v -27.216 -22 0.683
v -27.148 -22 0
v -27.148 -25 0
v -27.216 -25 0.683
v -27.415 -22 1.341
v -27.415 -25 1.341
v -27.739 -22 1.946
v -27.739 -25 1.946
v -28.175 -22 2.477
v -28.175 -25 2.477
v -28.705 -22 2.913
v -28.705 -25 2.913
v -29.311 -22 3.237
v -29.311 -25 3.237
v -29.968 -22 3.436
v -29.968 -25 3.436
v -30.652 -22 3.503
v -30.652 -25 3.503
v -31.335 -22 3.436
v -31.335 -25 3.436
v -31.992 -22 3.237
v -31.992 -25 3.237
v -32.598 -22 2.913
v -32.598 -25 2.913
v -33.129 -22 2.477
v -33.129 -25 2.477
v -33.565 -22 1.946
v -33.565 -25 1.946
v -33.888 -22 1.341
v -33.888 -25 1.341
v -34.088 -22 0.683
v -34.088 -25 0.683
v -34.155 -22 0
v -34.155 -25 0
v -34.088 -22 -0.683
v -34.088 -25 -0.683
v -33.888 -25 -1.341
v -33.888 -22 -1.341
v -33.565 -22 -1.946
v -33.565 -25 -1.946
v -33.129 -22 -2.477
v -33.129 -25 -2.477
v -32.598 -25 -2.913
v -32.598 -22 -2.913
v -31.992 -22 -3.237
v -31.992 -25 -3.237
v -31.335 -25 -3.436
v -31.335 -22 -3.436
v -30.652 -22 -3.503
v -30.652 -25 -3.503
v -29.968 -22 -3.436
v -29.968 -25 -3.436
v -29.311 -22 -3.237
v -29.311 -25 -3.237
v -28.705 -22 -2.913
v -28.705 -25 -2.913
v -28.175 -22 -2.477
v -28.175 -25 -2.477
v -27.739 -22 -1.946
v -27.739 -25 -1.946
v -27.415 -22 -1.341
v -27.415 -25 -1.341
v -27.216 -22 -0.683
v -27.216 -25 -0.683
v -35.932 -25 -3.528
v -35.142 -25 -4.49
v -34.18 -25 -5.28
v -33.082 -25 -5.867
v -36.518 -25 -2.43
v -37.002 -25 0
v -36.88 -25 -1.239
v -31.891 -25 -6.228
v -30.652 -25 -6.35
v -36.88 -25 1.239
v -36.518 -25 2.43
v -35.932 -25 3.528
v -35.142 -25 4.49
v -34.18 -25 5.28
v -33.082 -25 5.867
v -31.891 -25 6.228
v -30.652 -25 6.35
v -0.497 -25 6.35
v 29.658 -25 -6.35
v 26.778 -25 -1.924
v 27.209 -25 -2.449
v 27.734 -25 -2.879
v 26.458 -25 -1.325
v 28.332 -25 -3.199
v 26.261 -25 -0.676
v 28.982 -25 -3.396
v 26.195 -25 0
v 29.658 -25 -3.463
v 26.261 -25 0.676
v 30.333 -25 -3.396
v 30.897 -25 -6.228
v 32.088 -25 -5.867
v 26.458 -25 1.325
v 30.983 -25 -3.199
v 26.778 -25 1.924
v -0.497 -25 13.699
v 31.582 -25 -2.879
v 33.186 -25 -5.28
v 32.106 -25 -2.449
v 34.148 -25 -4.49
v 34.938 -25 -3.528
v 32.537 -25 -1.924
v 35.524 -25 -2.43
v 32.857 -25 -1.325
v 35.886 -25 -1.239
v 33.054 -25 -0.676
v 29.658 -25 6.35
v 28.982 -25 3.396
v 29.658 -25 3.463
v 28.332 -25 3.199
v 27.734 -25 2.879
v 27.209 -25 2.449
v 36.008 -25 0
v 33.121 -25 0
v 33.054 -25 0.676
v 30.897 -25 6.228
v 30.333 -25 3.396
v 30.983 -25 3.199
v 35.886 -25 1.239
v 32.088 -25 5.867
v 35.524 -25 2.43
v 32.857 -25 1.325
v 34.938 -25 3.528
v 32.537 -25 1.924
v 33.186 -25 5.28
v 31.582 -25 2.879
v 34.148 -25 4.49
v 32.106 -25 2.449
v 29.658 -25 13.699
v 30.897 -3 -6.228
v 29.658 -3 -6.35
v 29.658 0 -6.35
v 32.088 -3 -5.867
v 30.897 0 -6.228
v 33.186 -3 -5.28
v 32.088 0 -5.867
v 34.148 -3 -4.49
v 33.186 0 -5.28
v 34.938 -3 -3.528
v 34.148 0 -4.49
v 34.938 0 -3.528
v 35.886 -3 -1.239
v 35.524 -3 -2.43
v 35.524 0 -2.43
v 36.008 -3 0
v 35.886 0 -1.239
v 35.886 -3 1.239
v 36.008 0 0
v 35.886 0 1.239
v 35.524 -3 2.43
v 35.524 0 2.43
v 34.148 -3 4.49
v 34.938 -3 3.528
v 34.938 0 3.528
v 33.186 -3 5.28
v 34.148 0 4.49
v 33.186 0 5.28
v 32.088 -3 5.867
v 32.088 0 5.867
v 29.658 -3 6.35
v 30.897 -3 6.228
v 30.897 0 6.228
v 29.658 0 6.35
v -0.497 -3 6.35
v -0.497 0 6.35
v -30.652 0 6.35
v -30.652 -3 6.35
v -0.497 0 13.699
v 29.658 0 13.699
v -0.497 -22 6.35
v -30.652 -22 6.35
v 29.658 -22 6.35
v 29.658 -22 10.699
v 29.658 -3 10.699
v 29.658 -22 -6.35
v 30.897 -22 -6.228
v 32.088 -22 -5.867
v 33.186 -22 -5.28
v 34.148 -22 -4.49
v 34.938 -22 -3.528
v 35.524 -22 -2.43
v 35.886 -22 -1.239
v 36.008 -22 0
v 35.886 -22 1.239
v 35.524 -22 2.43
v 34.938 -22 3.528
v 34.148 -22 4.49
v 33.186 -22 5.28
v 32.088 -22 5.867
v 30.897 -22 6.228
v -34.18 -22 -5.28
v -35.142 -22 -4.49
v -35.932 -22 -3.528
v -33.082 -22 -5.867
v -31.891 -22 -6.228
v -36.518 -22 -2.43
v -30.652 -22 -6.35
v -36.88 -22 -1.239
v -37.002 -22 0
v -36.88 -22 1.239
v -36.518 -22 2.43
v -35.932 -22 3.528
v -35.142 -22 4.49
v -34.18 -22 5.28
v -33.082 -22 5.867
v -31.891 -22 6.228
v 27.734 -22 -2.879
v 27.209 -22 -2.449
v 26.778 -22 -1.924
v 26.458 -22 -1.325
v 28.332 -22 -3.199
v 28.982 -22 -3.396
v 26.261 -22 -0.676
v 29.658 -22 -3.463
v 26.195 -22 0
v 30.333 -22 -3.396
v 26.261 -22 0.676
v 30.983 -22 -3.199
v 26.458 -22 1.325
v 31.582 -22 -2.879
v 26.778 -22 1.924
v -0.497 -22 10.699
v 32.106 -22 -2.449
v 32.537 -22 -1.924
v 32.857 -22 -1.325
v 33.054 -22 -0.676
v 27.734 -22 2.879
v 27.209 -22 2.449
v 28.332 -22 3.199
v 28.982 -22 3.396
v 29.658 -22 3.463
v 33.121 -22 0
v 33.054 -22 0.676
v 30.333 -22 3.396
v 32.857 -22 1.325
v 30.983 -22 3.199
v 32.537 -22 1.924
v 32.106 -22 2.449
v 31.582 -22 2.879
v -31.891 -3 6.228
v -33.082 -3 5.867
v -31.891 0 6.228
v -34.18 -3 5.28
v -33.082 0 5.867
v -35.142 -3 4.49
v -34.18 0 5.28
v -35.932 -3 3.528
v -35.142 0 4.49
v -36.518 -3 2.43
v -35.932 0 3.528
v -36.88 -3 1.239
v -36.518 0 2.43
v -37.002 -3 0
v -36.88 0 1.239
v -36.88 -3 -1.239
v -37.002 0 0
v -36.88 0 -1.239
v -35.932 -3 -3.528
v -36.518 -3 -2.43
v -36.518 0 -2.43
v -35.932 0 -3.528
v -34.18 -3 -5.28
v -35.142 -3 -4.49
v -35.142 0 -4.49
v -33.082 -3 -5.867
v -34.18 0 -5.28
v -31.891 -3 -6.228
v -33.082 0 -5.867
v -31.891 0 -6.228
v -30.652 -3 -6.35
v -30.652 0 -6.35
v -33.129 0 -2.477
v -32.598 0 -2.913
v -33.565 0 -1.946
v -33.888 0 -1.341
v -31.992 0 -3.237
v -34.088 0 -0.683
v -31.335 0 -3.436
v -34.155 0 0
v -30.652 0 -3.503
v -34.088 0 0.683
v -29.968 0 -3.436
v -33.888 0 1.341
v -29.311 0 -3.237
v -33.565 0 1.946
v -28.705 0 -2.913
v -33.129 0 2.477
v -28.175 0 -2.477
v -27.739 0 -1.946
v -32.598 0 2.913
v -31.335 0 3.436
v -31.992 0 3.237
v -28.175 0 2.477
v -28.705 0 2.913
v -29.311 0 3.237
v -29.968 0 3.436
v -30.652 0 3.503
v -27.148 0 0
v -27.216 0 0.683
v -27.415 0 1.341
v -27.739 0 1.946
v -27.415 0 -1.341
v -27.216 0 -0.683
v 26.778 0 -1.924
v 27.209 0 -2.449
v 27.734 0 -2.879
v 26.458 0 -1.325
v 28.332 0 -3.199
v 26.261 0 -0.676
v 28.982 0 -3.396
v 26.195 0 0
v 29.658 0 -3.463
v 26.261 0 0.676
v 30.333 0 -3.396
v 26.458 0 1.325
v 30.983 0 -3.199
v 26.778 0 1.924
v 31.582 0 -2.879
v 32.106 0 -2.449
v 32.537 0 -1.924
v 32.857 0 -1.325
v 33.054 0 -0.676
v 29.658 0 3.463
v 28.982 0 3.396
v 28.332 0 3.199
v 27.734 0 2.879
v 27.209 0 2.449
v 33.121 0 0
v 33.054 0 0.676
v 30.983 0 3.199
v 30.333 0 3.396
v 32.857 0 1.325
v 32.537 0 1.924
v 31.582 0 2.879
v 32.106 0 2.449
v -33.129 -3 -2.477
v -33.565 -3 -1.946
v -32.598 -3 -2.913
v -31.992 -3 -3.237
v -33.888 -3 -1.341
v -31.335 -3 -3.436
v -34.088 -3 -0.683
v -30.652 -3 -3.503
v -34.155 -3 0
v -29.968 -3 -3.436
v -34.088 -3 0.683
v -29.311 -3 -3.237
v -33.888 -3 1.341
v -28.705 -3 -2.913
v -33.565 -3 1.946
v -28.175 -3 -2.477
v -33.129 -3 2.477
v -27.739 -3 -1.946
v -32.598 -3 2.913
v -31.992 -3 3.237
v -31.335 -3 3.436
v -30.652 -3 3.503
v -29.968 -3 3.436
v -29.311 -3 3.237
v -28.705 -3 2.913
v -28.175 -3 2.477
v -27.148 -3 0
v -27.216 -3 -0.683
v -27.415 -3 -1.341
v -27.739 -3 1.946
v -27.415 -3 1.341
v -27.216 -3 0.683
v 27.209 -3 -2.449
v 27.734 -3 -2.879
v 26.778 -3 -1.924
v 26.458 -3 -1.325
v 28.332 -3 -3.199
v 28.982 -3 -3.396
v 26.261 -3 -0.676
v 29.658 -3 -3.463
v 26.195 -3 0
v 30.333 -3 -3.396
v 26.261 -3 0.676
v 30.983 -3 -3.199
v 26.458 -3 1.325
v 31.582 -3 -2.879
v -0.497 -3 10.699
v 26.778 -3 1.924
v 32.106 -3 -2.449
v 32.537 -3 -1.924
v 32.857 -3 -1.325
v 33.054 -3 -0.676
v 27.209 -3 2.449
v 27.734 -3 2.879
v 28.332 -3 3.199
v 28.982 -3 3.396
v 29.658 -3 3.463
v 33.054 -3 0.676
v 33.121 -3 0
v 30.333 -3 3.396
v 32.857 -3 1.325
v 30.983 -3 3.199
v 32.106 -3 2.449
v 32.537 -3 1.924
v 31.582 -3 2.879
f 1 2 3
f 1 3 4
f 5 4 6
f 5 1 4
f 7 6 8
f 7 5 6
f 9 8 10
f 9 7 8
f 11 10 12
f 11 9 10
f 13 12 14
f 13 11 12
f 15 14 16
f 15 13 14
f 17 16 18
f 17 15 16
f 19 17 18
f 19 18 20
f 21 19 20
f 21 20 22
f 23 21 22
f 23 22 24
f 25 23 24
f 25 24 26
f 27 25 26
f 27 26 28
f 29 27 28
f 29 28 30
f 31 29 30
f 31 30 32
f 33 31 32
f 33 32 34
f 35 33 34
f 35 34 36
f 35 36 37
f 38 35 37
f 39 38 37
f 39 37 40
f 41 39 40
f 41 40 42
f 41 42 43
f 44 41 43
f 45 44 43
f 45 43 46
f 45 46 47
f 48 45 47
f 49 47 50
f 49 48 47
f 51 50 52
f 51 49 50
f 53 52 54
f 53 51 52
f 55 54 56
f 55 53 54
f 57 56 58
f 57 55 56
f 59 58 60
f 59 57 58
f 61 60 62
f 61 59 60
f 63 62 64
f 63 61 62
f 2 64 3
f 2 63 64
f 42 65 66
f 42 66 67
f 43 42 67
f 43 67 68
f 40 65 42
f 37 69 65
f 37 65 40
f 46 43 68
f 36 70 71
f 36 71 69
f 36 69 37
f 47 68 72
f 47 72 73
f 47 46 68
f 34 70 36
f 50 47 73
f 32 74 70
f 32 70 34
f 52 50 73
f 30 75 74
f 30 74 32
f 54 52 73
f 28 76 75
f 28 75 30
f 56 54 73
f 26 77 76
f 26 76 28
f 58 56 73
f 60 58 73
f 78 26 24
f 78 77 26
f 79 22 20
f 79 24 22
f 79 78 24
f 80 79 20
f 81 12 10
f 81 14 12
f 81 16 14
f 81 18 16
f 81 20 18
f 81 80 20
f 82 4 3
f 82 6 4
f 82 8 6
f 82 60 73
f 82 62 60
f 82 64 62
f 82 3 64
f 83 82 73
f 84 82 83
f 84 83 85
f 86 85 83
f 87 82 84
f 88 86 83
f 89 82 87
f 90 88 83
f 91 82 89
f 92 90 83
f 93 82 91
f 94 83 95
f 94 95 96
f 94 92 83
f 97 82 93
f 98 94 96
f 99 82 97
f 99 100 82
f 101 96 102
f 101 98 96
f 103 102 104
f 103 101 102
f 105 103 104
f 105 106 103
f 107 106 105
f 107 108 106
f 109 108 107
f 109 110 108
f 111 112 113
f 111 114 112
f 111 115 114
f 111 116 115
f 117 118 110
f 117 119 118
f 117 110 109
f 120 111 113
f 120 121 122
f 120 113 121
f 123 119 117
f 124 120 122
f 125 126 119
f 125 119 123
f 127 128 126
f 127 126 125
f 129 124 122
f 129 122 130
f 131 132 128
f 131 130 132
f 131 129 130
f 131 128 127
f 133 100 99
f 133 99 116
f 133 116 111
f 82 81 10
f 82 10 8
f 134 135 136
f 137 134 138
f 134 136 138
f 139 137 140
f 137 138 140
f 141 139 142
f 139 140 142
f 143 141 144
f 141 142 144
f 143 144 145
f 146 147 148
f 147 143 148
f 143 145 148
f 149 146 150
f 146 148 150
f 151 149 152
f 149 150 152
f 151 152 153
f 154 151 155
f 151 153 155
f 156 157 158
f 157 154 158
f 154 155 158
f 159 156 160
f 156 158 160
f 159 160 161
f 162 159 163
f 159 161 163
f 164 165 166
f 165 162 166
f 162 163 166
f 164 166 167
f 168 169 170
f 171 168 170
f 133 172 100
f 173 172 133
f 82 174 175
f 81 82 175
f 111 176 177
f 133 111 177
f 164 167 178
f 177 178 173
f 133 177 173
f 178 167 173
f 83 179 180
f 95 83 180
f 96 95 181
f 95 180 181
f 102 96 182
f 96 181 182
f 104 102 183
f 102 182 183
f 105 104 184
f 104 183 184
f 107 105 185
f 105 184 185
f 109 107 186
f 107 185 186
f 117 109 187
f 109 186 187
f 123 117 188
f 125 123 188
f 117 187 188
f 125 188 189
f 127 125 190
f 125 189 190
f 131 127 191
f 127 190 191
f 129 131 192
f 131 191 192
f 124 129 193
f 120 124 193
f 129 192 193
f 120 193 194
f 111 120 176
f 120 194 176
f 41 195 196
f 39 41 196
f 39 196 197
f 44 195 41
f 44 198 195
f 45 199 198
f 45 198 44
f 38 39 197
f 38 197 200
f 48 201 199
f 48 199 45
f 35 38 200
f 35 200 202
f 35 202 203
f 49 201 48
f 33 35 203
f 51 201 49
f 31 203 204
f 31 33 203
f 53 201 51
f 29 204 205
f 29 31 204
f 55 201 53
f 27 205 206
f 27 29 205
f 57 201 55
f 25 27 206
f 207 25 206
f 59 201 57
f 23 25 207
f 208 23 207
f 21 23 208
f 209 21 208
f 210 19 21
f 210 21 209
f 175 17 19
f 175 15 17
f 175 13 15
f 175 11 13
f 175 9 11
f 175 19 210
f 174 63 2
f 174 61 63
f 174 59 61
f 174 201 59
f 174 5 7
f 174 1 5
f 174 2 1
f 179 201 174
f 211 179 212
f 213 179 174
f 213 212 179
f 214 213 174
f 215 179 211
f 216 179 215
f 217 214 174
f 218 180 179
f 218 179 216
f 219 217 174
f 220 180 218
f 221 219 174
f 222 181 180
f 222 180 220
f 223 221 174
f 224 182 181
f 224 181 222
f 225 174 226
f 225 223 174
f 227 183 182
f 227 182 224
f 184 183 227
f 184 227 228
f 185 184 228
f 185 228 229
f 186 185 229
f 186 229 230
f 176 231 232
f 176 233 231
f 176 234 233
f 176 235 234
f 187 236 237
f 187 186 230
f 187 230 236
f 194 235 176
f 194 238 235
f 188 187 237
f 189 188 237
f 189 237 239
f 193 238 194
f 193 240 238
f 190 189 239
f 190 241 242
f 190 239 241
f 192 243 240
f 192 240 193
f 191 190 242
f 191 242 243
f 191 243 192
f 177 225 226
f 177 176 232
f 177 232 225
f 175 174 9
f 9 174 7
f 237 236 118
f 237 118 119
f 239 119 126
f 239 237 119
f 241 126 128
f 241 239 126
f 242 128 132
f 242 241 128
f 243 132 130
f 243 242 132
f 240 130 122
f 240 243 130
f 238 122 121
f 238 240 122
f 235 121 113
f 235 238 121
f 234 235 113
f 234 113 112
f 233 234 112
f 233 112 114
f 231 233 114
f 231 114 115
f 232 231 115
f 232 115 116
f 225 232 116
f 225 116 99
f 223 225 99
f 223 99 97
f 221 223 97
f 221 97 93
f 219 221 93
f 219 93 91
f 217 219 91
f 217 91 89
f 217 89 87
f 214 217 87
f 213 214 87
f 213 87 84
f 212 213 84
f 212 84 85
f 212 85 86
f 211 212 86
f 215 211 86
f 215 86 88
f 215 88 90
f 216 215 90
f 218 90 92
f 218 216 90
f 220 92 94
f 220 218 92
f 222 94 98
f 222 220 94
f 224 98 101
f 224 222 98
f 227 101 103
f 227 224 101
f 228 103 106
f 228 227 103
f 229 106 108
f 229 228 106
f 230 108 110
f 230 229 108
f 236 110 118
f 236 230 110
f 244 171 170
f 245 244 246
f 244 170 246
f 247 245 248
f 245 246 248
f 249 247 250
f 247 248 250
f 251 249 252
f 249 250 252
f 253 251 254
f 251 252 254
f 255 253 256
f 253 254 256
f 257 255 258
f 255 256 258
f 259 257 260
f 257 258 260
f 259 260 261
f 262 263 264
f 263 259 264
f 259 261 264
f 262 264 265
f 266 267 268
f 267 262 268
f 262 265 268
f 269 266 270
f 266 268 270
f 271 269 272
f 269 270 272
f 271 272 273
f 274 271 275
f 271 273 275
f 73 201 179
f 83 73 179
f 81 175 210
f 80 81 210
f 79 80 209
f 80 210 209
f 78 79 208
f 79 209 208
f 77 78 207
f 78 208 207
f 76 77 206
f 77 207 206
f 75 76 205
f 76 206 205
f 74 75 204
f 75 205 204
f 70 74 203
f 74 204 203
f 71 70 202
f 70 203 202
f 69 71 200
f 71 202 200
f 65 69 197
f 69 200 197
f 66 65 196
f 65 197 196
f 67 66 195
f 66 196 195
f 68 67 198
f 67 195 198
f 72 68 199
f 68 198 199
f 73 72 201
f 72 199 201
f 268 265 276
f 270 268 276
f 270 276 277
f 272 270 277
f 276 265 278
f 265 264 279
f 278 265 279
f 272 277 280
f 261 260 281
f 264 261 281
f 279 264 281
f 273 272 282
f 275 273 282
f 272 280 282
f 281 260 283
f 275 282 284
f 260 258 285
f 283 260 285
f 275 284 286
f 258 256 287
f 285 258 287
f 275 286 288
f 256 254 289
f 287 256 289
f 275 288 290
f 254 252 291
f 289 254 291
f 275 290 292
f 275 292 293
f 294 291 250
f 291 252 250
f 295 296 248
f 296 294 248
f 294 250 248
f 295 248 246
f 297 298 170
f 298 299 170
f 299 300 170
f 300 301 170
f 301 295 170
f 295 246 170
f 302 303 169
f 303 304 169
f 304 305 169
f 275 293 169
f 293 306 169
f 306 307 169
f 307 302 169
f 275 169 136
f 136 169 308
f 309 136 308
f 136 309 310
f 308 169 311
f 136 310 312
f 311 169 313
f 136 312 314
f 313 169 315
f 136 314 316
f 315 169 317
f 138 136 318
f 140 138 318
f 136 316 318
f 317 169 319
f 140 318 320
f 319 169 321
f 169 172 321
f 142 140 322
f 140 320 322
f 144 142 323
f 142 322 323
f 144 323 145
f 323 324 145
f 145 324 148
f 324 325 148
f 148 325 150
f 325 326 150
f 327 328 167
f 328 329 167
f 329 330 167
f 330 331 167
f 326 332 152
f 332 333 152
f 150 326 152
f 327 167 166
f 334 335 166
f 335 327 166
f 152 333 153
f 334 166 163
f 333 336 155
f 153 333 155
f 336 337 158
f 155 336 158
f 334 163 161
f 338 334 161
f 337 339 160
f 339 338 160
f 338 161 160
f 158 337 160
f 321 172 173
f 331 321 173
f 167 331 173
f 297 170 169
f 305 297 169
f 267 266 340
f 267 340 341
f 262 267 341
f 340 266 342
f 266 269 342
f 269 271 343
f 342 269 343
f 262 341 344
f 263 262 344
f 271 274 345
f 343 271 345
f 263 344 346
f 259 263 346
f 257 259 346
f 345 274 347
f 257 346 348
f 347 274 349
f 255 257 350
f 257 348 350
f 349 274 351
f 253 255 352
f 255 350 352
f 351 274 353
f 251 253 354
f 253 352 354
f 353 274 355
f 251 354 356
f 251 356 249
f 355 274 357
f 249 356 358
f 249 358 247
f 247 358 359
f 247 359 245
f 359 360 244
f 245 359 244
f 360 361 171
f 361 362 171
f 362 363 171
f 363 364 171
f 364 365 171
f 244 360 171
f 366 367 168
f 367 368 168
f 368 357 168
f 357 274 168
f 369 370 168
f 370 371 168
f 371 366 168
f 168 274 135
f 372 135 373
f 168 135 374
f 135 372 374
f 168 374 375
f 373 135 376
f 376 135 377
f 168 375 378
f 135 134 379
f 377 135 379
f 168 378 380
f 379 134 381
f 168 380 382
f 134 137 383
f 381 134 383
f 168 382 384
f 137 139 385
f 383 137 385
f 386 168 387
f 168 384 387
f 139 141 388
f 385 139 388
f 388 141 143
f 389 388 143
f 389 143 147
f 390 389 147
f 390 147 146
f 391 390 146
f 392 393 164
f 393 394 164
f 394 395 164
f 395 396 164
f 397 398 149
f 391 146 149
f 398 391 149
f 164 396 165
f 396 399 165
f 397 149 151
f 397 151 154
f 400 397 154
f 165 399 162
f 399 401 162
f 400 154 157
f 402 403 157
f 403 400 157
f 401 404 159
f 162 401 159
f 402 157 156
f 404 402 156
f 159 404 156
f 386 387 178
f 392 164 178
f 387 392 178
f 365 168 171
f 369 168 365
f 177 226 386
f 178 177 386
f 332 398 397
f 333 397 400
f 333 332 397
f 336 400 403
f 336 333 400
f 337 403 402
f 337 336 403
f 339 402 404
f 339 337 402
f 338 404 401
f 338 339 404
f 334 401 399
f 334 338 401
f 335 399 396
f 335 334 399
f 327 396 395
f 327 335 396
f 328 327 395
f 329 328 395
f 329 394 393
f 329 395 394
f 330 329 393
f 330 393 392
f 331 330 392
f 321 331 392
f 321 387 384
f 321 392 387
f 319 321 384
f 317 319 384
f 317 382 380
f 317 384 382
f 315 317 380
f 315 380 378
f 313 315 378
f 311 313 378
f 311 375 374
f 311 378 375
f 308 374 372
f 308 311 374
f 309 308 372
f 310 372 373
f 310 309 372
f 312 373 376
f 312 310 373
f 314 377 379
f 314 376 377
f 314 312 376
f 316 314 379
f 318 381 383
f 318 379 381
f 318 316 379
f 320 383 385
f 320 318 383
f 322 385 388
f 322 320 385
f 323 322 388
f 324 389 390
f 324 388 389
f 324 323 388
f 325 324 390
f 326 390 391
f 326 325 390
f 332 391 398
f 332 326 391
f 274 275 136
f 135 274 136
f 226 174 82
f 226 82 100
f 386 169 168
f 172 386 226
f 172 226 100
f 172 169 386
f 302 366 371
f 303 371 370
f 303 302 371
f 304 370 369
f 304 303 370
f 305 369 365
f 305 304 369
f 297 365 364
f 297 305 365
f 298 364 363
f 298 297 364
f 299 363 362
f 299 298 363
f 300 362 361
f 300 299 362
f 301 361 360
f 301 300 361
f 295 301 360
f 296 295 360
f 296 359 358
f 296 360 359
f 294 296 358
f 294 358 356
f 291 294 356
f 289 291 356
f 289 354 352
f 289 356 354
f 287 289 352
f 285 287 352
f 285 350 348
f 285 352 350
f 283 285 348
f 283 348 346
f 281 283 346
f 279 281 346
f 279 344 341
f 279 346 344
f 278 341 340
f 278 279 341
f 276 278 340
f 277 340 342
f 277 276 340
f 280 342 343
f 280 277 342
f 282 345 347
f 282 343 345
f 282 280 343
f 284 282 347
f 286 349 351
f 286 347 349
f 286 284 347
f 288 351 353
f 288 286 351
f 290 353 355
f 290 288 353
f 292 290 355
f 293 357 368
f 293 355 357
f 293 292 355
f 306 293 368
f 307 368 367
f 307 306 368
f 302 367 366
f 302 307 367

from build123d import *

# Parameters (mm, degrees)
F0_R     = 3.503318
F0_R_2   = 3.462973
F0_W     = 30.154734
F0_H     = 7.349356
F1_DEPTH = 25
F2_DEPTH = 25
F3_W     = 19
F3_H     = 27.151244
F4_DEPTH = 66.44531


with BuildPart() as f1:
    # F0 (on Front) → F1 (new body)
    with BuildSketch(Plane.XZ):
        with BuildLine():
            ThreePointArc((-30.65178, 6.35), (-37.00178, 0), (-30.65178, -6.35))
            Line((-30.65178, -6.35), (29.657688, -6.35))
            ThreePointArc((29.657688, -6.35), (36.007688, 0), (29.657688, 6.35))
            Line((29.657688, 6.35), (-0.497046, 6.35))
            Line((-0.497046, 6.35), (-30.65178, 6.35))
        make_face()
        with Locations((-30.65178, 0)):
            Circle(F0_R, mode=Mode.SUBTRACT)
        with Locations((29.657688, 0)):
            Circle(F0_R_2, mode=Mode.SUBTRACT)
        with Locations((14.580321, 10.024678)):
            Rectangle(F0_W, F0_H)
    extrude(amount=F1_DEPTH)

    # F0 (on Front) → F2 (join)
    with BuildSketch(Plane.XZ):
        with BuildLine():
            ThreePointArc((-30.65178, 6.35), (-37.00178, 0), (-30.65178, -6.35))
            Line((-30.65178, -6.35), (29.657688, -6.35))
            ThreePointArc((29.657688, -6.35), (36.007688, 0), (29.657688, 6.35))
            Line((29.657688, 6.35), (-0.497046, 6.35))
            Line((-0.497046, 6.35), (-30.65178, 6.35))
        make_face()
        with Locations((-30.65178, 0)):
            Circle(F0_R, mode=Mode.SUBTRACT)
        with Locations((29.657688, 0)):
            Circle(F0_R_2, mode=Mode.SUBTRACT)
        with Locations((14.580321, 10.024678)):
            Rectangle(F0_W, F0_H)
    extrude(amount=F2_DEPTH)

    # F3 (on Right) → F4 (cut, symmetric)
    with BuildSketch(Plane.YZ):
        with Locations((-12.5, -2.876266)):
            Rectangle(F3_W, F3_H)
    extrude(amount=F4_DEPTH, both=True, mode=Mode.SUBTRACT)


solid = f1.part
